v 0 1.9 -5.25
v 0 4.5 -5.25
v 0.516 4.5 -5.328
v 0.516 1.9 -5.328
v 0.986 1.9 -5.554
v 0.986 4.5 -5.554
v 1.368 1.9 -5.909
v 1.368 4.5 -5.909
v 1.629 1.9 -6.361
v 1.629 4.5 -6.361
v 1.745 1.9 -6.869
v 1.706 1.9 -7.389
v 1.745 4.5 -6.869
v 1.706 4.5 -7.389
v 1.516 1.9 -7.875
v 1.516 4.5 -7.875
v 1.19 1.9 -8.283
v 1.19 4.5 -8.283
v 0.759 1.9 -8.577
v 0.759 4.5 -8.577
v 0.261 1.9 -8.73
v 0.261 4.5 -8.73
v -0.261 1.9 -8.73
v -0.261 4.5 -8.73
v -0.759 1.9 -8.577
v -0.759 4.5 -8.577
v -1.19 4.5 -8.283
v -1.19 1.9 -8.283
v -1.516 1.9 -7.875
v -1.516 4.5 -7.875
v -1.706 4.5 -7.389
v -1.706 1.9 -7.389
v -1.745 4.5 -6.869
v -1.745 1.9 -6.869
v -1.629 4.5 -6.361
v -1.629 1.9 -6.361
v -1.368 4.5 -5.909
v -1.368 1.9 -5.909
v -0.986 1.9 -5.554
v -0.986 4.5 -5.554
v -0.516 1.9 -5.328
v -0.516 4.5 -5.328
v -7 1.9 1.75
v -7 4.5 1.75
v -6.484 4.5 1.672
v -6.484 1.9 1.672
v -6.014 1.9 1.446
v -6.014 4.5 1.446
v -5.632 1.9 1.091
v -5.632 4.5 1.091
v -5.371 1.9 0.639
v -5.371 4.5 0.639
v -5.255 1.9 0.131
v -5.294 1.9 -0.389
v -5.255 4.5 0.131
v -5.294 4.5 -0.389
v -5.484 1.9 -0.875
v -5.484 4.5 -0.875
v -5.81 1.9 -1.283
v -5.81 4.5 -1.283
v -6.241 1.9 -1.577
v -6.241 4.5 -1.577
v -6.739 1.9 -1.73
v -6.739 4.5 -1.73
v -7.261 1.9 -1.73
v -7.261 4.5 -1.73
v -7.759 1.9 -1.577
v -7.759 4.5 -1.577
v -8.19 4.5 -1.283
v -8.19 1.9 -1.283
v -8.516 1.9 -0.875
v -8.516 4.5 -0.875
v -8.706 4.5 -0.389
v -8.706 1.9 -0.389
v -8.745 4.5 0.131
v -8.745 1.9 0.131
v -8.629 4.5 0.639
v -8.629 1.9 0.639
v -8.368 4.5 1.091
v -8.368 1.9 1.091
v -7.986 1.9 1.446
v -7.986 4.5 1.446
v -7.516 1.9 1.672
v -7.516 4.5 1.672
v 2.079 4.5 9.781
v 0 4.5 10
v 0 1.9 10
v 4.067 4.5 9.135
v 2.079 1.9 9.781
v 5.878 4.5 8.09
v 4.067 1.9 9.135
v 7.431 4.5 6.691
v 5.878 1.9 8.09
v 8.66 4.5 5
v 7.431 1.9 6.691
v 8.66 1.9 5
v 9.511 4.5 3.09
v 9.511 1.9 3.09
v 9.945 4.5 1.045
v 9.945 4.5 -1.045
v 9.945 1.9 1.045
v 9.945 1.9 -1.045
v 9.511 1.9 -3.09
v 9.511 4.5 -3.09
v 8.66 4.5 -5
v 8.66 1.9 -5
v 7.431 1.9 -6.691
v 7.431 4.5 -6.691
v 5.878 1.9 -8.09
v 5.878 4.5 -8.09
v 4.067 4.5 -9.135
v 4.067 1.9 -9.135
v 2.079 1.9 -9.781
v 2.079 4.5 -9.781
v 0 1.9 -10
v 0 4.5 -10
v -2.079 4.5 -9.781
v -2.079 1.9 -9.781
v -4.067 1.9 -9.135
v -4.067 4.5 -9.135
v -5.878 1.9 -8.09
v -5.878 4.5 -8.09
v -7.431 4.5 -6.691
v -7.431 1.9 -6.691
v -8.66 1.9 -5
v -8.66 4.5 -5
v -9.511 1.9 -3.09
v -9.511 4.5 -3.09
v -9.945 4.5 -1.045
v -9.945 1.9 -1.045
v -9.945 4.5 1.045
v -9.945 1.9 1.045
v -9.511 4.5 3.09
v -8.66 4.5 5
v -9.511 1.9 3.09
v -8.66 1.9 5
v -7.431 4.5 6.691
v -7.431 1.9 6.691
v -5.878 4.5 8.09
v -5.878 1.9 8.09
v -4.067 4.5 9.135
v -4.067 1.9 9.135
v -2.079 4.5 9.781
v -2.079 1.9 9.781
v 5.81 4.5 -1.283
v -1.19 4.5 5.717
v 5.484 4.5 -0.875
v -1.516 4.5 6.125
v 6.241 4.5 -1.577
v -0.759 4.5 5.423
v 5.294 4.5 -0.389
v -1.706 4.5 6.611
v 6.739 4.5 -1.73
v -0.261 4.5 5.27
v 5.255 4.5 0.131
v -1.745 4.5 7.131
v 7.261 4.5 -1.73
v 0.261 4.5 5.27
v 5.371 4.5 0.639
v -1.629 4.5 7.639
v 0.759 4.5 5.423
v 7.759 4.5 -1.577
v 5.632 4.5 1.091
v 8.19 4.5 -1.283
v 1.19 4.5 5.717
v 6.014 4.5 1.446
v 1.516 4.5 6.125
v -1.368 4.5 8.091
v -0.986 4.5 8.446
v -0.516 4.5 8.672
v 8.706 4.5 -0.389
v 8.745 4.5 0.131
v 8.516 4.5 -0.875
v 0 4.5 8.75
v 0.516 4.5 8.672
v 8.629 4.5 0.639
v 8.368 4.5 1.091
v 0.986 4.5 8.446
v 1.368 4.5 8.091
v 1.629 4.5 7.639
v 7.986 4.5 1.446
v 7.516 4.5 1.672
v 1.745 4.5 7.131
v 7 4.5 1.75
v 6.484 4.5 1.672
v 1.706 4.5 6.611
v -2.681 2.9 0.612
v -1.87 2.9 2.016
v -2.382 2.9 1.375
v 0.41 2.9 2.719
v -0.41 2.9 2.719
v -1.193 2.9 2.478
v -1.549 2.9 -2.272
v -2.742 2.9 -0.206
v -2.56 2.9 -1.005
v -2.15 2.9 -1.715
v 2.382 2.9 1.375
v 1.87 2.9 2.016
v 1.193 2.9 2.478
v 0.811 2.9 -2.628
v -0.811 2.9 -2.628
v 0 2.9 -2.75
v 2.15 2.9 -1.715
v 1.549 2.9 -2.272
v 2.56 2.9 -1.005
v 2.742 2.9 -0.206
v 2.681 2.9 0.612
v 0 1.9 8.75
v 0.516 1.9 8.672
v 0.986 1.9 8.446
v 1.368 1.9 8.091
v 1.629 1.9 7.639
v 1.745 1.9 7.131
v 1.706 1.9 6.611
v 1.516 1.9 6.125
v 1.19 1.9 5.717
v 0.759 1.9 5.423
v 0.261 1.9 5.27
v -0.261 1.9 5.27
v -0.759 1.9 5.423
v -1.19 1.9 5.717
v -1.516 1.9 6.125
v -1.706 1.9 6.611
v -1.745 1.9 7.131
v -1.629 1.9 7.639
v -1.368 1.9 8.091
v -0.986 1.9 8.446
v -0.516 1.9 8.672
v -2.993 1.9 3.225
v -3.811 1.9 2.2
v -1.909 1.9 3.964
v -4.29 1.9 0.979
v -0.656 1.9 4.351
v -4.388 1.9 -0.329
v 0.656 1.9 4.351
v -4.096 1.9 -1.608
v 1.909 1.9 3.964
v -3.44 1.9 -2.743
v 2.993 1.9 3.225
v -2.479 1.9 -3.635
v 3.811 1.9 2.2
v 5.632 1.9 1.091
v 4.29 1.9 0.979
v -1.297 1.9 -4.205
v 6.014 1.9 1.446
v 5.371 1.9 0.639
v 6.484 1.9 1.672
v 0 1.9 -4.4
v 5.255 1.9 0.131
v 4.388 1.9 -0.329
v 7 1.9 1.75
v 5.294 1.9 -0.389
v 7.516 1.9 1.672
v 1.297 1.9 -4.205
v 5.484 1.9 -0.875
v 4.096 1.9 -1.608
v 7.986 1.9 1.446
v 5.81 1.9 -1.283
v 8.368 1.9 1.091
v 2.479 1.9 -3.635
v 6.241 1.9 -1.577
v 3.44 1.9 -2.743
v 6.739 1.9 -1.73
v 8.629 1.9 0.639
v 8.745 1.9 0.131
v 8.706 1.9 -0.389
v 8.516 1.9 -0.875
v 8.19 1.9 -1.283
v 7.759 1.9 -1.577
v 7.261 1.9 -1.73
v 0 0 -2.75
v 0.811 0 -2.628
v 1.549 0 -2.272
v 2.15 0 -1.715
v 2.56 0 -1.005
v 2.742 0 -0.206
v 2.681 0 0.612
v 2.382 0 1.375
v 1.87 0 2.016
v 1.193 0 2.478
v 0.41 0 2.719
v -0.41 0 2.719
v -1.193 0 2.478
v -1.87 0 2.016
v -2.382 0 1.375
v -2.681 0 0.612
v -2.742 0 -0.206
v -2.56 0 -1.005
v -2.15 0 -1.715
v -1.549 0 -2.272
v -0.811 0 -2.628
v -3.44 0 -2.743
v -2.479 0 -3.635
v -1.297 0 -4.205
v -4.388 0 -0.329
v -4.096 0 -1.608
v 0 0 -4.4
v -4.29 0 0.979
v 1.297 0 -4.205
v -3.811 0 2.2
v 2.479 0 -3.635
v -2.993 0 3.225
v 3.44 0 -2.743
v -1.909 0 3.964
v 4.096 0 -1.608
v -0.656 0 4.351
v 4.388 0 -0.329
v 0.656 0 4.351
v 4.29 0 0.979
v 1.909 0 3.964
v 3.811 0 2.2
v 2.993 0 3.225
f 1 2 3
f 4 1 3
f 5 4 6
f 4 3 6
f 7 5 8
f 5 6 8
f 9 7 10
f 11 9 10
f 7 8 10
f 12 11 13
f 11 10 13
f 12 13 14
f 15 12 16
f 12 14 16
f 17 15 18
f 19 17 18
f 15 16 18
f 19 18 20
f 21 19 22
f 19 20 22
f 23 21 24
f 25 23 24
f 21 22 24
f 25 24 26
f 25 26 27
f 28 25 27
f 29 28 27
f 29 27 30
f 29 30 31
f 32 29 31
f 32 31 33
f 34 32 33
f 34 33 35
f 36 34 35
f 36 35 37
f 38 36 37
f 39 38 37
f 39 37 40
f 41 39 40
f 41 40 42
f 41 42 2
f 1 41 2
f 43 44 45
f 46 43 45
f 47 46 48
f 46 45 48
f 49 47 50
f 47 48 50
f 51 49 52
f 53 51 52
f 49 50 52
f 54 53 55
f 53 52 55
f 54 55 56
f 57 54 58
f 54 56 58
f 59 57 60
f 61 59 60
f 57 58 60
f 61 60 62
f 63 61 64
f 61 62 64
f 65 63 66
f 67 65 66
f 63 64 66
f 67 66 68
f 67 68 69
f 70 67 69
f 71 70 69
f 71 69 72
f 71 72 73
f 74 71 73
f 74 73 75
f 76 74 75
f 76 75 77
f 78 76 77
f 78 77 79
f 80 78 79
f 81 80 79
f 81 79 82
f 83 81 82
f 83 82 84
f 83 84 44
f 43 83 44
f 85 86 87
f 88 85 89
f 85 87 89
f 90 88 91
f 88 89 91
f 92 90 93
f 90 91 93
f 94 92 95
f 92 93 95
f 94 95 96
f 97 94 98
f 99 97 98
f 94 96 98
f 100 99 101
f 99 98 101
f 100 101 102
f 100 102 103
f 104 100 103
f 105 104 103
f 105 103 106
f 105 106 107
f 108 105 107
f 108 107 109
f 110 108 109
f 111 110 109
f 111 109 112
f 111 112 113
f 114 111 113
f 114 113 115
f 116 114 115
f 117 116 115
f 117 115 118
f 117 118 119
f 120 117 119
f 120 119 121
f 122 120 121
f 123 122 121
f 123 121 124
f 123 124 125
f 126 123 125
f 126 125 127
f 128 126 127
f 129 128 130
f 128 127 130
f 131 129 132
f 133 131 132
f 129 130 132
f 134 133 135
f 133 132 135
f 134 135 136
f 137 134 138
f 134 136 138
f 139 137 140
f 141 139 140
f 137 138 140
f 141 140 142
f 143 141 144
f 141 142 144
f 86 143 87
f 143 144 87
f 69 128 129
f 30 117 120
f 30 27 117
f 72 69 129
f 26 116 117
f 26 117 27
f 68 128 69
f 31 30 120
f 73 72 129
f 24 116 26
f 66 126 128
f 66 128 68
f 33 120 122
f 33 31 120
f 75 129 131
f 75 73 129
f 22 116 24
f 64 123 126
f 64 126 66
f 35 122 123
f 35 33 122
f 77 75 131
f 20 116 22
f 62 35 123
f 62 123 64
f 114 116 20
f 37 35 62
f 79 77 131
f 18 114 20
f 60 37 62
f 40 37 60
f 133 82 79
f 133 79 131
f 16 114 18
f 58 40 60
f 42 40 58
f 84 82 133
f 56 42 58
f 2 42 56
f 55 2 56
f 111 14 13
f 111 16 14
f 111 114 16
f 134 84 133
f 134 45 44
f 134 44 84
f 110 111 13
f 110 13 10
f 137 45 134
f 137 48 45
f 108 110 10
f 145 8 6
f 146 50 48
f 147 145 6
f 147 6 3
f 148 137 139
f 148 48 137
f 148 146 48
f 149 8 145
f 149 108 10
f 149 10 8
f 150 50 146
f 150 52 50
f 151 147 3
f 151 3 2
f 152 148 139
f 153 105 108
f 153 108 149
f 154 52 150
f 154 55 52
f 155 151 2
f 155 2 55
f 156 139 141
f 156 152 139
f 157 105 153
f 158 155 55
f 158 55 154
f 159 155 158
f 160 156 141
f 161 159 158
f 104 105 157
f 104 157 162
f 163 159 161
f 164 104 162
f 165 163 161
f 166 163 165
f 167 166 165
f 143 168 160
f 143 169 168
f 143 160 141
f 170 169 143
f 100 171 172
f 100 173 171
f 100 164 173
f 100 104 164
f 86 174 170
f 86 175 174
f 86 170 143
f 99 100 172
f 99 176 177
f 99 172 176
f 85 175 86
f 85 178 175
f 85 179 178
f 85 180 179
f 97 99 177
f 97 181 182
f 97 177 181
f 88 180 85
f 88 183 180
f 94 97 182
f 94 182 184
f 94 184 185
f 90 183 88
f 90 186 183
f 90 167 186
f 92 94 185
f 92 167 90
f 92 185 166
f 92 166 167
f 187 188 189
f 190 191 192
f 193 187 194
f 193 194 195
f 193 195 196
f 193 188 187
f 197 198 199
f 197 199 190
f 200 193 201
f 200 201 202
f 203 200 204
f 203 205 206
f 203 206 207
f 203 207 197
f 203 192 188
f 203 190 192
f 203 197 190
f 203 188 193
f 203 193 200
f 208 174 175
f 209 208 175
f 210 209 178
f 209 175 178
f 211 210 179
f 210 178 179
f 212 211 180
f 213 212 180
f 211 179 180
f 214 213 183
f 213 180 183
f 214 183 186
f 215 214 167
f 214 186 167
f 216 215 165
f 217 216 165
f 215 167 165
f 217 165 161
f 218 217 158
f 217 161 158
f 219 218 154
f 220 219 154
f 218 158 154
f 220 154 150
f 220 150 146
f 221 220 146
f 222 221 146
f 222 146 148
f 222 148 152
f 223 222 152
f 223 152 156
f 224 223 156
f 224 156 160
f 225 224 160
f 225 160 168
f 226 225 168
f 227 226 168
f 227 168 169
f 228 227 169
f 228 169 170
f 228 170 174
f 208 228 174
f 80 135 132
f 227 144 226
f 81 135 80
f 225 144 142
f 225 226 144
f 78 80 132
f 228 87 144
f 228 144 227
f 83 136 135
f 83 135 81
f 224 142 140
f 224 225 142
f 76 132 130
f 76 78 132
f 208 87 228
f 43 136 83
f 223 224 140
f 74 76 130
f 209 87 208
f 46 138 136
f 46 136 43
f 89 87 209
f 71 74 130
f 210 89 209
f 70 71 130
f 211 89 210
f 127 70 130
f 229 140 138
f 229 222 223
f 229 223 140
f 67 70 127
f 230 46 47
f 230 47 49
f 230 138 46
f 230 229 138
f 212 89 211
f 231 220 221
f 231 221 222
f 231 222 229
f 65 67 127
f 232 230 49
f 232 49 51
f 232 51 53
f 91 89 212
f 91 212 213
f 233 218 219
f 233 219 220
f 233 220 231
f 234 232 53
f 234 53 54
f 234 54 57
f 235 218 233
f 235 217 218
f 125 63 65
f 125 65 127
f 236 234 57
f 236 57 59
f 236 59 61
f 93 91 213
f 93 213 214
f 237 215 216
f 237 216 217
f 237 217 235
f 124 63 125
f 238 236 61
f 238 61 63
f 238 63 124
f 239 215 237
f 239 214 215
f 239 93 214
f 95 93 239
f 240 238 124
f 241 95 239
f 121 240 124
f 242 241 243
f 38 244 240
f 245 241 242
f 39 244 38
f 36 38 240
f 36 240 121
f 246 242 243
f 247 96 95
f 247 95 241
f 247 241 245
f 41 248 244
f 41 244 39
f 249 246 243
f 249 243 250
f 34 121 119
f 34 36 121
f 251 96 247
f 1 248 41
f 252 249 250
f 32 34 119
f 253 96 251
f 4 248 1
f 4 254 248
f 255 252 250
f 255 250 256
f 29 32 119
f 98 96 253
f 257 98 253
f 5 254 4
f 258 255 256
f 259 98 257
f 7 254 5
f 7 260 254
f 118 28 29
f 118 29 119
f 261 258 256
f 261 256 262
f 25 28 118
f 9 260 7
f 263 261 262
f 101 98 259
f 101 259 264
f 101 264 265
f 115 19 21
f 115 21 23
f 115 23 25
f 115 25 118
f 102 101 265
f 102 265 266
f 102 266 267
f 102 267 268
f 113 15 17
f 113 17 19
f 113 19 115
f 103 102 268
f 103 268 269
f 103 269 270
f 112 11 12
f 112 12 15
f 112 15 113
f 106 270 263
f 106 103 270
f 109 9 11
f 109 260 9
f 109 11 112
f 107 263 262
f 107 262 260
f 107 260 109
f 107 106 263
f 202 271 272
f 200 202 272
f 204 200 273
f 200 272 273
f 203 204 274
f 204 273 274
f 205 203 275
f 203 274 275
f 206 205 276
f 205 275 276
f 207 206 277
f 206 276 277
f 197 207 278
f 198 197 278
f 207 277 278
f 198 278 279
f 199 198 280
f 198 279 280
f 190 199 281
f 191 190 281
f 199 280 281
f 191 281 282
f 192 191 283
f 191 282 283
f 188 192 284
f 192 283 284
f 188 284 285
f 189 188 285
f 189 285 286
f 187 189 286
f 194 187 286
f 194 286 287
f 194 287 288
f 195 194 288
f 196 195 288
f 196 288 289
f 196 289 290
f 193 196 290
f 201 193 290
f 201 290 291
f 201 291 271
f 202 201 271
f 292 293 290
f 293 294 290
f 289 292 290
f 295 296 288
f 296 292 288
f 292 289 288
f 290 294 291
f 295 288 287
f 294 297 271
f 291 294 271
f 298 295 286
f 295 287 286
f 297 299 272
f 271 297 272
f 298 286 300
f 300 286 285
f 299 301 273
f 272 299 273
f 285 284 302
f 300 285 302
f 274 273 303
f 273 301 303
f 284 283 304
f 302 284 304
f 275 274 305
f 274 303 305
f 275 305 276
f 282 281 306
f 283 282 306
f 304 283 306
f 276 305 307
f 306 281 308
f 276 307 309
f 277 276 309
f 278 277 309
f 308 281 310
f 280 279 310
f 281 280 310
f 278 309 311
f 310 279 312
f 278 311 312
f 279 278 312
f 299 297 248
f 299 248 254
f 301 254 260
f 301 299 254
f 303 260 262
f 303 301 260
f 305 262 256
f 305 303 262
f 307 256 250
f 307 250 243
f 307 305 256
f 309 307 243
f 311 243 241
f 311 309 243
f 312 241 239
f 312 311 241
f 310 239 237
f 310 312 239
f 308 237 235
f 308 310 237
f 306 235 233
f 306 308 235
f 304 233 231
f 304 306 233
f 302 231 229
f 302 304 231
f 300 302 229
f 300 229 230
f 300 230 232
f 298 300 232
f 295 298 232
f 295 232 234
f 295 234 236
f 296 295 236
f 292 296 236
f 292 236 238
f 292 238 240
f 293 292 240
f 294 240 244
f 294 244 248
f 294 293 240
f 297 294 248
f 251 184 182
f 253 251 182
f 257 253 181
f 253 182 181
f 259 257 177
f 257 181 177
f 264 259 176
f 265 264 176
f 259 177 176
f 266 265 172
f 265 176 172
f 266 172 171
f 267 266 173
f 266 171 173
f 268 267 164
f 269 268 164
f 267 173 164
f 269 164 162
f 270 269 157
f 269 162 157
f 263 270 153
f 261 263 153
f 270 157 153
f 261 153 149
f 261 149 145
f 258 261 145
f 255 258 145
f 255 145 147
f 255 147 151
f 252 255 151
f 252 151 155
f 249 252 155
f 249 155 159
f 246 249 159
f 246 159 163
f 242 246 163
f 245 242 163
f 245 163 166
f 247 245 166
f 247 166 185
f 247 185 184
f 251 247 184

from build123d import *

# Parameters (mm, degrees)
SKETCH1_R           = 10
BOSS_EXTRUDE1_DEPTH = 4.5
SKETCH2_R           = 10
SKETCH2_R_2         = 4.4
SKETCH2_R_3         = 2.75
CUT_EXTRUDE1_DEPTH  = 1.9
SKETCH4_R           = 1.75
CUT_EXTRUDE2_DEPTH  = 15.84082208
SKETCH5_R           = 2.75
CUT_EXTRUDE3_DEPTH  = 1


with BuildPart() as part:
    # Sketch1 → Boss-Extrude1 (new body)
    with BuildSketch(Plane(origin=(0, 0, 0), x_dir=(1, 0, 0), z_dir=(0, 1, 0))):
        with Locations(Location((0, 0, 0), (0, 0, 270))):
            Circle(SKETCH1_R)
    extrude(amount=BOSS_EXTRUDE1_DEPTH)

    # Sketch2 → Cut-Extrude1 (cut)
    # profile 1 of 2: a face of its own
    with BuildSketch(Plane.XZ):
        with Locations(Location((0, 0, 0), (0, 0, 270))):
            Circle(SKETCH2_R)
        with Locations(Location((0, 0, 0), (0, 0, 270))):
            Circle(SKETCH2_R_2, mode=Mode.SUBTRACT)
    # profile 2 of 2: a face of its own
    with BuildSketch(Plane.XZ):
        with Locations(Location((0, 0, 0), (0, 0, 270))):
            Circle(SKETCH2_R_3)
    extrude(amount=-CUT_EXTRUDE1_DEPTH, mode=Mode.SUBTRACT)

    # Sketch4 → Cut-Extrude2 (cut, through all)
    with BuildSketch(Plane(origin=(0, 4.5, 0), x_dir=(1, 0, 0), z_dir=(0, 1, 0))):
        with Locations(Location((0, 7, 0), (0, 0, 270))):
            Circle(SKETCH4_R)
        with Locations(Location((7, 0, 0), (0, 0, 270))):
            Circle(SKETCH4_R)
        with Locations(Location((0, -7, 0), (0, 0, 270))):
            Circle(SKETCH4_R)
        with Locations(Location((-7, 0, 0), (0, 0, 270))):
            Circle(SKETCH4_R)
    extrude(amount=-CUT_EXTRUDE2_DEPTH, mode=Mode.SUBTRACT)

    # Sketch5 → Cut-Extrude3 (cut)
    with BuildSketch(Plane.XZ.offset(-1.9)):
        with Locations(Location((0, 0, 0), (0, 0, 270))):
            Circle(SKETCH5_R)
    extrude(amount=-CUT_EXTRUDE3_DEPTH, mode=Mode.SUBTRACT)


solid = part.part
